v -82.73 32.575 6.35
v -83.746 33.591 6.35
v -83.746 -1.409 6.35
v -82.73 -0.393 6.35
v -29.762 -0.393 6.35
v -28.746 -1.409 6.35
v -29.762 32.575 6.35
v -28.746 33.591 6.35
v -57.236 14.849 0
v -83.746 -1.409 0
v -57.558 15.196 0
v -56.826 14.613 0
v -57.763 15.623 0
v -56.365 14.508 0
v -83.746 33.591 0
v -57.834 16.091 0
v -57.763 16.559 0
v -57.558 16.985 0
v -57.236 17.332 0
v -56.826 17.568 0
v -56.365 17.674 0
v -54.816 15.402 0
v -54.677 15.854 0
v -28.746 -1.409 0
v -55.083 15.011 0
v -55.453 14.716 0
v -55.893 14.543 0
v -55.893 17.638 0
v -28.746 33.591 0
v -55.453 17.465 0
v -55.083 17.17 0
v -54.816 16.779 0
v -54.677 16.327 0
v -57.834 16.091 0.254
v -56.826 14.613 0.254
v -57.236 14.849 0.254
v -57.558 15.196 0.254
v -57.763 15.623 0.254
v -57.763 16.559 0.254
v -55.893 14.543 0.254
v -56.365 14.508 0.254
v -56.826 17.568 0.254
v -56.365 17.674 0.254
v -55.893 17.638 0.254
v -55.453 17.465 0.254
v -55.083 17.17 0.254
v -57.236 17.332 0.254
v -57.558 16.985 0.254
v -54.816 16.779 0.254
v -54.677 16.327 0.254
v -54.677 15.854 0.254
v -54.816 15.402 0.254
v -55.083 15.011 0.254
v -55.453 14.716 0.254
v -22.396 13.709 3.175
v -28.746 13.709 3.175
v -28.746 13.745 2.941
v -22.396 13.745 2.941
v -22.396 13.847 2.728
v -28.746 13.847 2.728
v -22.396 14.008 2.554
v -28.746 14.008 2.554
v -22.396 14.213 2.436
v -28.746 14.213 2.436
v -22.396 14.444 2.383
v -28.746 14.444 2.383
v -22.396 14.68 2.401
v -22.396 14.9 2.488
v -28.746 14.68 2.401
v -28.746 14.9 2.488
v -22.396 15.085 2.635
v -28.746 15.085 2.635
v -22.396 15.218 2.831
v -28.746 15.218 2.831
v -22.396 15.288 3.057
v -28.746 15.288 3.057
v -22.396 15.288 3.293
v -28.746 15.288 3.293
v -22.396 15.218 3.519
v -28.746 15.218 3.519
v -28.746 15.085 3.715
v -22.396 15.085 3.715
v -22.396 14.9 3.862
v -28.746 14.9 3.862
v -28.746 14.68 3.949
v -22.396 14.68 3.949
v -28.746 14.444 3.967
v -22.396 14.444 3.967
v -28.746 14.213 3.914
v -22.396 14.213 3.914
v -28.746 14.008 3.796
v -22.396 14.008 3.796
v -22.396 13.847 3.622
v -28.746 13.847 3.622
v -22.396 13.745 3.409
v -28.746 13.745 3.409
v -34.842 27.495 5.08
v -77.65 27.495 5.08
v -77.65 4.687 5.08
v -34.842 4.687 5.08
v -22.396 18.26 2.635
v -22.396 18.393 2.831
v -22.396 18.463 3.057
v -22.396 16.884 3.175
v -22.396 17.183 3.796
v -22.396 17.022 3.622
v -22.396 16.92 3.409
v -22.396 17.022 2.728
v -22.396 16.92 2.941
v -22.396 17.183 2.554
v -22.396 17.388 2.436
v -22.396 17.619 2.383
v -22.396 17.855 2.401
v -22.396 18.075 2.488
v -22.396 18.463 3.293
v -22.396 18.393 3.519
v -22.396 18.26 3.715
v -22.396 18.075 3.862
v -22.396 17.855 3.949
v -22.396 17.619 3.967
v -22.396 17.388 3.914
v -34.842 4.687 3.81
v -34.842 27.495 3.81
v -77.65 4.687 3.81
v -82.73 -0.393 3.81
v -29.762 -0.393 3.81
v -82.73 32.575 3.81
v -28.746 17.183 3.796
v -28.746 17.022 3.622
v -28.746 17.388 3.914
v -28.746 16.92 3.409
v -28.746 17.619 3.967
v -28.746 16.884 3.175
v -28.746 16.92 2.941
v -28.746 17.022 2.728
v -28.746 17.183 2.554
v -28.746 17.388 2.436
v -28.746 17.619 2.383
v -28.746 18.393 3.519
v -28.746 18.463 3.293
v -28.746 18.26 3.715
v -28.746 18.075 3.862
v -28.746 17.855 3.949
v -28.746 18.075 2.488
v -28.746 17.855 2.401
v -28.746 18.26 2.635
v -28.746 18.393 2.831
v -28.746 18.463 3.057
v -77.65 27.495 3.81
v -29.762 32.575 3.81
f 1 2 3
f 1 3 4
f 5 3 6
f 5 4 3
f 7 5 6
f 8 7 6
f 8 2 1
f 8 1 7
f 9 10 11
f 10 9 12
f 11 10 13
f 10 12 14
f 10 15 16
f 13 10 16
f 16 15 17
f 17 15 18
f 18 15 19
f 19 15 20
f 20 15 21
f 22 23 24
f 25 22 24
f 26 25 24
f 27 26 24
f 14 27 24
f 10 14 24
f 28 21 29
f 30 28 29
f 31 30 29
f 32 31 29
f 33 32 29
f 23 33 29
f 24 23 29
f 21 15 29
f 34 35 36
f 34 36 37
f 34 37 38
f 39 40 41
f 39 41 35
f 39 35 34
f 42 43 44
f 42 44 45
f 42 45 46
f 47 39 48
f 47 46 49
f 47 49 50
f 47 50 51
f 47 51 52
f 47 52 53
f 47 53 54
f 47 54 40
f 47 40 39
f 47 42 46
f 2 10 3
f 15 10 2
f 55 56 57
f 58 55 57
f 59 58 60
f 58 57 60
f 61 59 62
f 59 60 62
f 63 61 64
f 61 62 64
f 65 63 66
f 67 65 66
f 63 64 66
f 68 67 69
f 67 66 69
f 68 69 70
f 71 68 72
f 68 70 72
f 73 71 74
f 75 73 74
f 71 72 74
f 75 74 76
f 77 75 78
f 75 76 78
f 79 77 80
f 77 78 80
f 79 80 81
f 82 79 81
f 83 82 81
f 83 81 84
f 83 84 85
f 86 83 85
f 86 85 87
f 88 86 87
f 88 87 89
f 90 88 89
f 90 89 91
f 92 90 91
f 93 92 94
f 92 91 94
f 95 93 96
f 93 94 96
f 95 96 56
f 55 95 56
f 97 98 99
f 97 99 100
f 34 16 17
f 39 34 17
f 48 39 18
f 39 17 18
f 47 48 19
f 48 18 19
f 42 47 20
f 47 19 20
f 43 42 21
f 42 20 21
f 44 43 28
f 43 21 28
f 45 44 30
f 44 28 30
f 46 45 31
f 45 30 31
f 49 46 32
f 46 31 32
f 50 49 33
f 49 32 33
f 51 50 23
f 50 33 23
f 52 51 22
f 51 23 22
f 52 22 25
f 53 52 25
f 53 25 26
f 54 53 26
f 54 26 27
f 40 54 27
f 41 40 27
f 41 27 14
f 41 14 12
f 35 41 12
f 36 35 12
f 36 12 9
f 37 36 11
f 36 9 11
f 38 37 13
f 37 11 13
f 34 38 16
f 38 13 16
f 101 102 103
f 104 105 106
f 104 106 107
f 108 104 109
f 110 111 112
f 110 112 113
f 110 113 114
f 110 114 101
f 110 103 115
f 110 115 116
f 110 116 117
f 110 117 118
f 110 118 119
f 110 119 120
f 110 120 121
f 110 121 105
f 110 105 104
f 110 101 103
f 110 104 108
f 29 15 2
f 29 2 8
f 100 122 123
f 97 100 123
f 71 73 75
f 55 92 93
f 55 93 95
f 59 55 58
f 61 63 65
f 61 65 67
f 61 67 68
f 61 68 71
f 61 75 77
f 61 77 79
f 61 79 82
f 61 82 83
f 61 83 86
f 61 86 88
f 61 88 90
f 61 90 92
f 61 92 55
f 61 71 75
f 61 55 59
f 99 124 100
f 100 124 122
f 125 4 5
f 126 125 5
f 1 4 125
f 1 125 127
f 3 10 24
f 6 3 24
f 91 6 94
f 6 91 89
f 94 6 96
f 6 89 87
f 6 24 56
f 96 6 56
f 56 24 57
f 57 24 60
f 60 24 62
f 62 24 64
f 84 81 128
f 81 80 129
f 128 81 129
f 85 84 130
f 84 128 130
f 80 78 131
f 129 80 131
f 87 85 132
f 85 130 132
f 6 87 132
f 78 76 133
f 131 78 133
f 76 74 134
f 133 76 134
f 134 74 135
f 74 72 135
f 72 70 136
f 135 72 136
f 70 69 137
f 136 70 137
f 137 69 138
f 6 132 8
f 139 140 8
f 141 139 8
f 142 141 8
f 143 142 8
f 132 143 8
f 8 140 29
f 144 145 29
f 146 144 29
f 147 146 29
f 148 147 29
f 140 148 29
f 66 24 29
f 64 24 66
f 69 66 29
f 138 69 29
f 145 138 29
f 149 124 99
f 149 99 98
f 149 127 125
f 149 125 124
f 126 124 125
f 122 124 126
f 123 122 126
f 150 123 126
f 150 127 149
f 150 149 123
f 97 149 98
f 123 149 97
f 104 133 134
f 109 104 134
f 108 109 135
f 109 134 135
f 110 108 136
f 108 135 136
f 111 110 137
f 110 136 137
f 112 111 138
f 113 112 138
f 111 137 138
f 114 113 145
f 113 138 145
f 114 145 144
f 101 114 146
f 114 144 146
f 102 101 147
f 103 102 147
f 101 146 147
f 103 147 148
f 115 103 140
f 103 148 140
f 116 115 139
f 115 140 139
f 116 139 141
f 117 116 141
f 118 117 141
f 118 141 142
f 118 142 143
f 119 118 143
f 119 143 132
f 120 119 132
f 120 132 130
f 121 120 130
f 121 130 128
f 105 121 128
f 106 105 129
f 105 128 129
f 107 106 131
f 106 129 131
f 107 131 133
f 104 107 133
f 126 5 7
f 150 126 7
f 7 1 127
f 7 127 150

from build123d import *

# Parameters (mm, degrees)
SKETCH1_W           = 55
SKETCH1_H           = 35
BOSS_EXTRUDE1_DEPTH = 6.35
SKETCH2_R           = 0.79375
BOSS_EXTRUDE2_DEPTH = 6.35
SKETCH4_R           = 1.587499993
CUT_EXTRUDE2_DEPTH  = 0.254
SKETCH5_W           = 52.968
SKETCH5_H           = 32.968
CUT_EXTRUDE3_DEPTH  = 2.54
SKETCH6_W           = 42.808
SKETCH6_H           = 22.808
BOSS_EXTRUDE3_DEPTH = 1.27


with BuildPart() as part:
    # Sketch1 → Boss-Extrude1 (new body)
    with BuildSketch(Plane.XY):
        with Locations((-56.246376812, 16.09057971)):
            Rectangle(SKETCH1_W, SKETCH1_H)
    extrude(amount=BOSS_EXTRUDE1_DEPTH)

    # Sketch2 → Boss-Extrude2 (add)
    with BuildSketch(Plane(origin=(-28.746376812, 0, 0), x_dir=(0, 0, -1), z_dir=(1, 0, 0))):
        with Locations(Location((-3.175, 17.67807971, 0), (0, 0, 270))):
            Circle(SKETCH2_R)
        with Locations(Location((-3.175, 14.50307971, 0), (0, 0, 270))):
            Circle(SKETCH2_R)
    extrude(amount=BOSS_EXTRUDE2_DEPTH)

    # Sketch4 → Cut-Extrude2 (cut)
    with BuildSketch(Plane(origin=(0, 0, 0), x_dir=(-1, 0, 0), z_dir=(0, 0, -1))):
        with Locations((56.246376812, 16.09057971)):
            Circle(SKETCH4_R)
    extrude(amount=-CUT_EXTRUDE2_DEPTH, mode=Mode.SUBTRACT)

    # Sketch5 → Cut-Extrude3 (cut)
    with BuildSketch(Plane.XY.offset(6.35)):
        with Locations((-56.246376812, 16.09057971)):
            Rectangle(SKETCH5_W, SKETCH5_H)
    extrude(amount=-CUT_EXTRUDE3_DEPTH, mode=Mode.SUBTRACT)

    # Sketch6 → Boss-Extrude3 (add)
    with BuildSketch(Plane.XY.offset(3.81)):
        with Locations((-56.246376812, 16.09057971)):
            Rectangle(SKETCH6_W, SKETCH6_H)
    extrude(amount=BOSS_EXTRUDE3_DEPTH)


solid = part.part
